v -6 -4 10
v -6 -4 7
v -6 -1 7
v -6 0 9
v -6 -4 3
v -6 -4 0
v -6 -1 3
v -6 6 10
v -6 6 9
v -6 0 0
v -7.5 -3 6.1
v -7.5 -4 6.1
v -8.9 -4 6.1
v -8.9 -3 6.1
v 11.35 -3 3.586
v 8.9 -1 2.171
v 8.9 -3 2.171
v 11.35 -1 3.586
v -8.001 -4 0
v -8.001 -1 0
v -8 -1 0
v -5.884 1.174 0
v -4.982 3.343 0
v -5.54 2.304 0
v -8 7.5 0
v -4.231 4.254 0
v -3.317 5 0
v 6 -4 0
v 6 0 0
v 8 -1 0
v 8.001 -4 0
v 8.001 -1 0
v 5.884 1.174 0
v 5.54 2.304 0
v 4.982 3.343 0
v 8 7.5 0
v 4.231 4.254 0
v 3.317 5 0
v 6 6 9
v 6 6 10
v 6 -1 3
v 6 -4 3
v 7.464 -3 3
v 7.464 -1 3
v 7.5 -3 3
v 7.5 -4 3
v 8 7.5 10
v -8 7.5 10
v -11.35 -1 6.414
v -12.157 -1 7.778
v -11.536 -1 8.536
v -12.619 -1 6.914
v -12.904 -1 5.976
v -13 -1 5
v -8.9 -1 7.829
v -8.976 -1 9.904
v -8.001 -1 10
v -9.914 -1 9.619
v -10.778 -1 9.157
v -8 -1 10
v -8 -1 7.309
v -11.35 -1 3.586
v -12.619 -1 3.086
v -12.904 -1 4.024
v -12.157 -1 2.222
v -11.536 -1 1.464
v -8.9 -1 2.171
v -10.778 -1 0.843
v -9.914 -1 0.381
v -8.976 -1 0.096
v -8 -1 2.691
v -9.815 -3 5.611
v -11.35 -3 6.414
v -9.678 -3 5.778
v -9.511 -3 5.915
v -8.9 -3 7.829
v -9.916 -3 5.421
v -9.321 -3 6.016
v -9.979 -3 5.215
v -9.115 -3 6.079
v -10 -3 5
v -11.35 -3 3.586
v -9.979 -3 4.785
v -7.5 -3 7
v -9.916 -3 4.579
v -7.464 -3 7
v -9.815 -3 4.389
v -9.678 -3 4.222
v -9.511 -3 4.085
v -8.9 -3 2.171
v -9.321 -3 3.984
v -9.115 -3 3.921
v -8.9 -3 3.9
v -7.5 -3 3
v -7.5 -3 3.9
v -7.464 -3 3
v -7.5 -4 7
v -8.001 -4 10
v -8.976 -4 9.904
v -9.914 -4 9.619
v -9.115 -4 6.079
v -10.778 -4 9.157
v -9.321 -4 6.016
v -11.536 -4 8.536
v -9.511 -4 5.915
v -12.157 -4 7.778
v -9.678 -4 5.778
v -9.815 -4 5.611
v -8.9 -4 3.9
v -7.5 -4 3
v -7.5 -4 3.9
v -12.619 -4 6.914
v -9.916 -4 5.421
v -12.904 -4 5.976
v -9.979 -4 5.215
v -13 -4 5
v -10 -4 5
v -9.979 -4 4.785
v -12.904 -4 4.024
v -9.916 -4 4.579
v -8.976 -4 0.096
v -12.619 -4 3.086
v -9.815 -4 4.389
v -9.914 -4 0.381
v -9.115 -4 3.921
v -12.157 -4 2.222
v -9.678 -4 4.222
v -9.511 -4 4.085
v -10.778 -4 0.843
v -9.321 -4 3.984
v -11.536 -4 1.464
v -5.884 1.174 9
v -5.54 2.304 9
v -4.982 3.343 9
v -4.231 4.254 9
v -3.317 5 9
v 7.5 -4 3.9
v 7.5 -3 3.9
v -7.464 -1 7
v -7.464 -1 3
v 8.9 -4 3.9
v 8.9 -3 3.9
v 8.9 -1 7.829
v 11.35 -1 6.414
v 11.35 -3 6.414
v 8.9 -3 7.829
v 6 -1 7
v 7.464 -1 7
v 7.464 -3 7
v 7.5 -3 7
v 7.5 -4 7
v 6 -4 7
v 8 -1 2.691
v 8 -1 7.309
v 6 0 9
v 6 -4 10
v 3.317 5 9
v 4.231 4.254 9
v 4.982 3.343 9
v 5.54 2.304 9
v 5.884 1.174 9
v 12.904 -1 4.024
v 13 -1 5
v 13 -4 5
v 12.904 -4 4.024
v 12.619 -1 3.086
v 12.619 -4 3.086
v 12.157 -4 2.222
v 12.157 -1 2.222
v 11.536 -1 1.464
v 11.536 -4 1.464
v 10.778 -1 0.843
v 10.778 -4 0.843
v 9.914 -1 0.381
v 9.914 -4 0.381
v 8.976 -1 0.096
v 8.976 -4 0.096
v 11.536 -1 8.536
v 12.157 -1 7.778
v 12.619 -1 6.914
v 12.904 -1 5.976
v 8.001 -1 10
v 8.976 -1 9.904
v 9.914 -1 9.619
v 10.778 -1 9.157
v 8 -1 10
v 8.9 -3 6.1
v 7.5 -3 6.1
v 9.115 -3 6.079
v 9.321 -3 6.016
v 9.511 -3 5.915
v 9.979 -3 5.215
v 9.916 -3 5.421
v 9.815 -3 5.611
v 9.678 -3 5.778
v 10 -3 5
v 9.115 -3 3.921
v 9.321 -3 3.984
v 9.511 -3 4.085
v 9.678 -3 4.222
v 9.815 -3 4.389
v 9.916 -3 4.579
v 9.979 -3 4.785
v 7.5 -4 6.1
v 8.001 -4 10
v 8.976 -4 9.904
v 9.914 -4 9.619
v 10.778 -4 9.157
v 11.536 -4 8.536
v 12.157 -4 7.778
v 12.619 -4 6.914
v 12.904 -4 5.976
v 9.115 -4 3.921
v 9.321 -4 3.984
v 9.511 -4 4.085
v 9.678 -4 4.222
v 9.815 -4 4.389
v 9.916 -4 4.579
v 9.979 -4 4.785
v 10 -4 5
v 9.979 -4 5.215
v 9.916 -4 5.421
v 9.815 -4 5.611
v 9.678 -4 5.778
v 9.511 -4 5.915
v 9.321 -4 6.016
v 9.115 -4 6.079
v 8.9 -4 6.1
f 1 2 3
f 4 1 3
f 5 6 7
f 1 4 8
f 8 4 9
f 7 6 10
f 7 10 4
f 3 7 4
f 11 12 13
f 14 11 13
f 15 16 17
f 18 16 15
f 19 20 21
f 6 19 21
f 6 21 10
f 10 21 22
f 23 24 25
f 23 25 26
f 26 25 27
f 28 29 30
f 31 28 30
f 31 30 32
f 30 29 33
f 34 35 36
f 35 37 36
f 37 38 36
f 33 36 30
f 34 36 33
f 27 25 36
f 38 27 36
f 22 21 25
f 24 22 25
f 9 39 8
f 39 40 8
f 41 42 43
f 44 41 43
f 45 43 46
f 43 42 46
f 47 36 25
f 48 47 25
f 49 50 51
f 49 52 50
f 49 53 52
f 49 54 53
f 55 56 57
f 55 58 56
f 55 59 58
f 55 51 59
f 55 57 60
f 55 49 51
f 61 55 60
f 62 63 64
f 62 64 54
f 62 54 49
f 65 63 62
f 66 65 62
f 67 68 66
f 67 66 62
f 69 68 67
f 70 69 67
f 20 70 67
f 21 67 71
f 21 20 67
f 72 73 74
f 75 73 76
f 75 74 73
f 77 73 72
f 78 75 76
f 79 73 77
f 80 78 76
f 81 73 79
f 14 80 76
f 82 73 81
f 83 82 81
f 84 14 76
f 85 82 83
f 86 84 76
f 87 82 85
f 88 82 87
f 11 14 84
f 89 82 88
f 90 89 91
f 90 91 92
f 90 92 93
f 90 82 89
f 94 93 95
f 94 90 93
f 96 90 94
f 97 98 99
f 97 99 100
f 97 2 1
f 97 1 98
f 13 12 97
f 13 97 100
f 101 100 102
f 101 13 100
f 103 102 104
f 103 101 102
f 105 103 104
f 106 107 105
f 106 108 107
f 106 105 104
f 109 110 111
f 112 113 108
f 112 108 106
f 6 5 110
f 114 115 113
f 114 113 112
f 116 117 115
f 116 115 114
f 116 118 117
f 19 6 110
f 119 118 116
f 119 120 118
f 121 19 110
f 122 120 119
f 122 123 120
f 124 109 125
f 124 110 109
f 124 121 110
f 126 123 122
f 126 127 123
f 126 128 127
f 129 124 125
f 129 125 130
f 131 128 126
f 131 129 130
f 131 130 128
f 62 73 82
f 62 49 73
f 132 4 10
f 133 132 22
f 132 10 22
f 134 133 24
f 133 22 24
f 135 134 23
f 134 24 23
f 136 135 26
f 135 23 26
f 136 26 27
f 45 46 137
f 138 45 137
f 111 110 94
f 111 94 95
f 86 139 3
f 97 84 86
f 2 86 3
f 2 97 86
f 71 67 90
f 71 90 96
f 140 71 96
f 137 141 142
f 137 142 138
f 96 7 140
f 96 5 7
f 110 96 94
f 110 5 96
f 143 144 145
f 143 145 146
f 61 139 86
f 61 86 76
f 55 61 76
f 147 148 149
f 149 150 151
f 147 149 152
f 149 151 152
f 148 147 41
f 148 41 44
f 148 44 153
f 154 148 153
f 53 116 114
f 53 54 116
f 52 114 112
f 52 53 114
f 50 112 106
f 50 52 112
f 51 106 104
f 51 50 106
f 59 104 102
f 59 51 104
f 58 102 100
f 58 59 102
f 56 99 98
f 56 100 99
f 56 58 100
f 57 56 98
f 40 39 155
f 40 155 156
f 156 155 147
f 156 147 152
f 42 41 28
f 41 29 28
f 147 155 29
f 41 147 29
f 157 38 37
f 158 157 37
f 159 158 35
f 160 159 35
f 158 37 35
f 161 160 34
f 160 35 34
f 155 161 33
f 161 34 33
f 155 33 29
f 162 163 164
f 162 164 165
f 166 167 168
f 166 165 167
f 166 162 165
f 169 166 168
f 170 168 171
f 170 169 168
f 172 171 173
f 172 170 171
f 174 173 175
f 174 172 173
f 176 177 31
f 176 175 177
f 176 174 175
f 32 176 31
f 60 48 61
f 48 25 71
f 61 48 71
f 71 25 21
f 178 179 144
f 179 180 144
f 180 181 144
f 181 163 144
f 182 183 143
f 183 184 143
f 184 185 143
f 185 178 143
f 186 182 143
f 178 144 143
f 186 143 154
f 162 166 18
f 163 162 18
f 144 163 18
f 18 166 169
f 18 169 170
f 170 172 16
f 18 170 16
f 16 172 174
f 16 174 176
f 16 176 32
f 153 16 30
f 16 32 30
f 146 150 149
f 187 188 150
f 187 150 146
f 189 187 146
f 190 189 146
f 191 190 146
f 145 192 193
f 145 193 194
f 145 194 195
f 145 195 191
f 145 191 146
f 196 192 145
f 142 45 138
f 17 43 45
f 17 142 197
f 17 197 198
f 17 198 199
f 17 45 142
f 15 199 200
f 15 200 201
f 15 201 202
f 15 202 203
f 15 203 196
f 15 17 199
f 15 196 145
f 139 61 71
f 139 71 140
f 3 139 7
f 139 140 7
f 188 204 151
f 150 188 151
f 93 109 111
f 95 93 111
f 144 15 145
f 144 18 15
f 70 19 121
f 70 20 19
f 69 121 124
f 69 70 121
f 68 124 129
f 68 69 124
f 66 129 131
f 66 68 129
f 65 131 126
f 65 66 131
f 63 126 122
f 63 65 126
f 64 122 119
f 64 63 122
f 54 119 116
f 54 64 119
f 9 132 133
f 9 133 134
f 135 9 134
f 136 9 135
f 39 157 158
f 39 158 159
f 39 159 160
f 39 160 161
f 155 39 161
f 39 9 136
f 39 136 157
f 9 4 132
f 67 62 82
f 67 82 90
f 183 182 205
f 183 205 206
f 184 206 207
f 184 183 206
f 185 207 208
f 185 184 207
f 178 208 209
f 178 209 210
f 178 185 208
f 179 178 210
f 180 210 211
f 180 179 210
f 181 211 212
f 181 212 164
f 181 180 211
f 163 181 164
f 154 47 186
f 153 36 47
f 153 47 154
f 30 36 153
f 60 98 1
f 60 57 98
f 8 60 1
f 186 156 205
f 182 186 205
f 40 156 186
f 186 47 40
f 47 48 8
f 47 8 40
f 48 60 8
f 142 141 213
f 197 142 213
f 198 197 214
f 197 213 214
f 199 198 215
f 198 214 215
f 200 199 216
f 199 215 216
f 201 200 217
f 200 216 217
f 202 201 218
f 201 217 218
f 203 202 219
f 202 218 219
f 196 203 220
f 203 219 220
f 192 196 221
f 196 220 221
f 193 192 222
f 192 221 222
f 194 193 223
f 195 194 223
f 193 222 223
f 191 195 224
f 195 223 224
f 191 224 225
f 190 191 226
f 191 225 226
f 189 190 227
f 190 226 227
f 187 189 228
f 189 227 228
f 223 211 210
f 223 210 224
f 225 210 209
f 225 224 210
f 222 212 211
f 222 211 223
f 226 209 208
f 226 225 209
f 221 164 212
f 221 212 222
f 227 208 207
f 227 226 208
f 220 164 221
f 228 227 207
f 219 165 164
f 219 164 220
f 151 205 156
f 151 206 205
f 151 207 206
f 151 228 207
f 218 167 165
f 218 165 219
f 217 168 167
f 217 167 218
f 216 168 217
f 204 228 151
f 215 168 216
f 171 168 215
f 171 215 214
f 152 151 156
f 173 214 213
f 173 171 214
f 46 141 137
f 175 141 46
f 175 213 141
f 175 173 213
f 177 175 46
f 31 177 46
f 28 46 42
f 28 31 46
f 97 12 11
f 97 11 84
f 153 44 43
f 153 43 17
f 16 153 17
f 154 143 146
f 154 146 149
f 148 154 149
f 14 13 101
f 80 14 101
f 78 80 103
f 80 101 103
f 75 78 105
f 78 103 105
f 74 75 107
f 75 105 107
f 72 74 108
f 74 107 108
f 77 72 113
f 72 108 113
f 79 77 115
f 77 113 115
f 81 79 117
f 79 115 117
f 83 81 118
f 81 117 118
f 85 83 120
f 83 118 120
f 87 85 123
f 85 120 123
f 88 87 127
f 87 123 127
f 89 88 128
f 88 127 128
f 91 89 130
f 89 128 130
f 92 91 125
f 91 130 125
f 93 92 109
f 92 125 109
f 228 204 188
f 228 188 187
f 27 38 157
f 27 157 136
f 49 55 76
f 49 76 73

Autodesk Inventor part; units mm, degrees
ref_plane "YZ Plane" through (0, 0, 0) normal (1, 0, 0) x (0, 1, 0)
ref_plane "XZ Plane" through (0, 0, 0) normal (0, 1, 0) x (-1, 0, 0)
ref_plane "XY Plane" through (0, 0, 0) normal (0, 0, 1) x (1, 0, 0)
sketch "Эскиз1" plane through (0, 0, 0) normal (0, 0, 1) x (1, 0, 0)
  circle A0 centre (0, 0) radius 6
  line L0 (-6, 0) -> (6, 0)
  line L1 (6, 0) -> (6, 5)
  line L2 (6, 5) -> (-6, 5)
  line L3 (-6, 5) -> (-6, 0)
  line L4 (-6, 0) -> (6, 0)
  line L5 (6, 0) -> (6, -4)
  line L6 (6, -4) -> (-6, -4)
  line L7 (-6, -4) -> (-6, 0)
  line L8 (-6, -4) -> (-8, -4)
  line L9 (-8, -4) -> (-8, 5)
  line L10 (-8, 5) -> (-6, 5)
  line L11 (-6, 5) -> (-6, -4)
  line L12 (6, 5) -> (8, 5)
  line L13 (8, 5) -> (8, -4)
  line L14 (8, -4) -> (6, -4)
  line L15 (6, -4) -> (6, 5)
  line L16 (-8, 5) -> (8, 5)
  line L17 (8, 5) -> (8, 7.5)
  line L18 (8, 7.5) -> (-8, 7.5)
  line L19 (-8, 7.5) -> (-8, 5)
  line L20 (-8, -4) -> (-13, -4)
  line L21 (-13, -4) -> (-13, -1)
  line L22 (-13, -1) -> (-8, -1)
  line L23 (-8, -1) -> (-8, -4)
  line L24 (8, -4) -> (13, -4)
  line L25 (13, -4) -> (13, -1)
  line L26 (13, -1) -> (8, -1)
  line L27 (8, -1) -> (8, -4)
  point P0 (8, -1)
  point P1 (-8, -1)
  point P2 (-3.3166, 5)
  point P3 (3.3166, 5)
  dimension "d0" = 12
  dimension "d1" = 5
  dimension "d2" = 4
  dimension "d3" = 2
  dimension "d4" = 2
  dimension "d5" = 2.5
  dimension "d8" = 5
  dimension "d9" = 5
  dimension "d37" = 3
extrude "Выдавливание1" add sketch "Эскиз1" along normal blind 10 contours A0 L2 L1 | L1 L12 L13 L14 L5 | L2 A0 | A0 L2 L10 L19 L18 L17 L12 | L3 L2 A0 | L7 L8 L9 L10 L3 | L13 L26 L25 L24 | L20 L21 L22 L9
sketch "Эскиз2" plane through (-13, -1, 0) normal (0, 1, 0) x (1, 0, 0)
  line L0 (5, 0) -> (0, 0) projected
  line L1 (2.5, 0) -> (2.5, -10)
  line L2 (5, -10) -> (0, -10) projected
  line L3 (26, -10) -> (21, -10) projected
  line L4 (23.5, -10) -> (23.5, 0)
  line L5 (26, 0) -> (21, 0) projected
  line L6 (23.5, -5) -> (21.9, -5)
  line L7 (2.5, -5) -> (4.1, -5)
  point P0 (13, 0)
  dimension "d17" = 1.6
  dimension "d18" = 1.6
hole "Отверстие2" at (-8.9, -1, 5) at (8.9, -1, 5) direction (0, -1, 0) diameter 2.2 end through all
sketch "Эскиз3" plane through (8, -1, 0) normal (0, 1, 0) x (1, 0, 0)
  arc A0 (-16, -4.3675) -> (-16, -5.6325) centre (-16.9, -5) ccw projected
  arc A1 (0, -5.6325) -> (0, -4.3675) centre (0.9, -5) ccw projected
  line L0 (3.35, -6.4145) -> (0.9, -7.829)
  line L1 (0.9, -7.829) -> (-1.55, -6.4145)
  line L2 (-1.55, -6.4145) -> (-1.55, -3.5855)
  line L3 (-1.55, -3.5855) -> (0.9, -2.171)
  line L4 (0.9, -2.171) -> (3.35, -3.5855)
  line L5 (3.35, -3.5855) -> (3.35, -6.4145)
  line L6 (-19.35, -3.5855) -> (-16.9, -2.171)
  line L7 (-16.9, -2.171) -> (-14.45, -3.5855)
  line L8 (-14.45, -3.5855) -> (-14.45, -6.4145)
  line L9 (-14.45, -6.4145) -> (-16.9, -7.829)
  line L10 (-16.9, -7.829) -> (-19.35, -6.4145)
  line L11 (-19.35, -6.4145) -> (-19.35, -3.5855)
  line L12 (-21, 0) -> (-21, -10) projected
  line L13 (5, 0) -> (5, -10) projected
  point P0 (-8, 0)
  dimension "d26" = 4.9
extrude "Выдавливание2" cut sketch "Эскиз3" against normal blind 2
fillet "Сопряжение1" radius 5 4 edges at (-13, -2.5, 0) (-13, -2.5, 10) (13, -2.5, 0) (13, -2.5, 10)
sketch "Эскиз5" plane through (0, 0, 10) normal (0, 0, 1) x (1, 0, 0)
  line L0 (-6, -4) -> (-6, 0) projected
  line L1 (-6, 0) -> (6, 0)
  line L2 (6, 0) -> (6, 6)
  line L3 (6, 6) -> (-6, 6)
  line L4 (-6, 6) -> (-6, 0)
  line L5 (6, 0) -> (6, -4) projected
  line L6 (-3.3166, 5) -> (3.3166, 5) projected
  point P0 (0, 0)
  dimension "d34" = 1
extrude "Выдавливание4" cut sketch "Эскиз5" against normal blind 1
sketch "Эскиз6" plane through (-6, -4, 0) normal (0, -1, 0) x (1, 0, 0)
  line L0 (-1.5, 7) -> (0, 7)
  line L1 (0, 7) -> (0, 3)
  line L2 (0, 3) -> (-1.5, 3)
  line L3 (-1.5, 3) -> (-1.5, 7)
  line L4 (0, 0) -> (0, 10) projected
  line L5 (-2.9, 3.9) -> (-1.5, 3.9)
  line L6 (-1.5, 3.9) -> (-1.5, 6.1)
  line L7 (-1.5, 6.1) -> (-2.9, 6.1)
  line L8 (-2.9, 6.1) -> (-2.9, 3.9)
  circle A0 centre (-2.9, 5) radius 1.1 projected
  line L9 (14, 0) -> (-2, 0) projected
  line L10 (6, 0) -> (6, 10)
  line L11 (0, 10) -> (12, 10) projected
  line L12 (13.5, 7) -> (12, 7)
  line L13 (12, 7) -> (12, 3)
  line L14 (12, 3) -> (13.5, 3)
  line L15 (13.5, 3) -> (13.5, 7)
  line L16 (14.9, 3.9) -> (13.5, 3.9)
  line L17 (13.5, 3.9) -> (13.5, 6.1)
  line L18 (13.5, 6.1) -> (14.9, 6.1)
  line L19 (14.9, 6.1) -> (14.9, 3.9)
  point P0 (0, 5)
  point P1 (-2.9, 3.9)
  point P2 (-2.9, 6.1)
  point P3 (-2.9, 3.9)
  point P4 (-2.9, 6.1)
  point P5 (12, 5)
  point P6 (14.9, 5)
  point P7 (14.9, 5)
  dimension "d38" = 4
  dimension "d42" = 1.5
extrude "Выдавливание5" cut sketch "Эскиз6" against normal up to surface (3 mm away) contours L0 L1 L2 L3 | L3 L5 A0 L7 | A0 L8 | L15 L14 L13 L12 | L18 L19 L16 L15 picked at (-2.5898, 5.2959)
properties part number "Кронштейн для двигателей серии N"
